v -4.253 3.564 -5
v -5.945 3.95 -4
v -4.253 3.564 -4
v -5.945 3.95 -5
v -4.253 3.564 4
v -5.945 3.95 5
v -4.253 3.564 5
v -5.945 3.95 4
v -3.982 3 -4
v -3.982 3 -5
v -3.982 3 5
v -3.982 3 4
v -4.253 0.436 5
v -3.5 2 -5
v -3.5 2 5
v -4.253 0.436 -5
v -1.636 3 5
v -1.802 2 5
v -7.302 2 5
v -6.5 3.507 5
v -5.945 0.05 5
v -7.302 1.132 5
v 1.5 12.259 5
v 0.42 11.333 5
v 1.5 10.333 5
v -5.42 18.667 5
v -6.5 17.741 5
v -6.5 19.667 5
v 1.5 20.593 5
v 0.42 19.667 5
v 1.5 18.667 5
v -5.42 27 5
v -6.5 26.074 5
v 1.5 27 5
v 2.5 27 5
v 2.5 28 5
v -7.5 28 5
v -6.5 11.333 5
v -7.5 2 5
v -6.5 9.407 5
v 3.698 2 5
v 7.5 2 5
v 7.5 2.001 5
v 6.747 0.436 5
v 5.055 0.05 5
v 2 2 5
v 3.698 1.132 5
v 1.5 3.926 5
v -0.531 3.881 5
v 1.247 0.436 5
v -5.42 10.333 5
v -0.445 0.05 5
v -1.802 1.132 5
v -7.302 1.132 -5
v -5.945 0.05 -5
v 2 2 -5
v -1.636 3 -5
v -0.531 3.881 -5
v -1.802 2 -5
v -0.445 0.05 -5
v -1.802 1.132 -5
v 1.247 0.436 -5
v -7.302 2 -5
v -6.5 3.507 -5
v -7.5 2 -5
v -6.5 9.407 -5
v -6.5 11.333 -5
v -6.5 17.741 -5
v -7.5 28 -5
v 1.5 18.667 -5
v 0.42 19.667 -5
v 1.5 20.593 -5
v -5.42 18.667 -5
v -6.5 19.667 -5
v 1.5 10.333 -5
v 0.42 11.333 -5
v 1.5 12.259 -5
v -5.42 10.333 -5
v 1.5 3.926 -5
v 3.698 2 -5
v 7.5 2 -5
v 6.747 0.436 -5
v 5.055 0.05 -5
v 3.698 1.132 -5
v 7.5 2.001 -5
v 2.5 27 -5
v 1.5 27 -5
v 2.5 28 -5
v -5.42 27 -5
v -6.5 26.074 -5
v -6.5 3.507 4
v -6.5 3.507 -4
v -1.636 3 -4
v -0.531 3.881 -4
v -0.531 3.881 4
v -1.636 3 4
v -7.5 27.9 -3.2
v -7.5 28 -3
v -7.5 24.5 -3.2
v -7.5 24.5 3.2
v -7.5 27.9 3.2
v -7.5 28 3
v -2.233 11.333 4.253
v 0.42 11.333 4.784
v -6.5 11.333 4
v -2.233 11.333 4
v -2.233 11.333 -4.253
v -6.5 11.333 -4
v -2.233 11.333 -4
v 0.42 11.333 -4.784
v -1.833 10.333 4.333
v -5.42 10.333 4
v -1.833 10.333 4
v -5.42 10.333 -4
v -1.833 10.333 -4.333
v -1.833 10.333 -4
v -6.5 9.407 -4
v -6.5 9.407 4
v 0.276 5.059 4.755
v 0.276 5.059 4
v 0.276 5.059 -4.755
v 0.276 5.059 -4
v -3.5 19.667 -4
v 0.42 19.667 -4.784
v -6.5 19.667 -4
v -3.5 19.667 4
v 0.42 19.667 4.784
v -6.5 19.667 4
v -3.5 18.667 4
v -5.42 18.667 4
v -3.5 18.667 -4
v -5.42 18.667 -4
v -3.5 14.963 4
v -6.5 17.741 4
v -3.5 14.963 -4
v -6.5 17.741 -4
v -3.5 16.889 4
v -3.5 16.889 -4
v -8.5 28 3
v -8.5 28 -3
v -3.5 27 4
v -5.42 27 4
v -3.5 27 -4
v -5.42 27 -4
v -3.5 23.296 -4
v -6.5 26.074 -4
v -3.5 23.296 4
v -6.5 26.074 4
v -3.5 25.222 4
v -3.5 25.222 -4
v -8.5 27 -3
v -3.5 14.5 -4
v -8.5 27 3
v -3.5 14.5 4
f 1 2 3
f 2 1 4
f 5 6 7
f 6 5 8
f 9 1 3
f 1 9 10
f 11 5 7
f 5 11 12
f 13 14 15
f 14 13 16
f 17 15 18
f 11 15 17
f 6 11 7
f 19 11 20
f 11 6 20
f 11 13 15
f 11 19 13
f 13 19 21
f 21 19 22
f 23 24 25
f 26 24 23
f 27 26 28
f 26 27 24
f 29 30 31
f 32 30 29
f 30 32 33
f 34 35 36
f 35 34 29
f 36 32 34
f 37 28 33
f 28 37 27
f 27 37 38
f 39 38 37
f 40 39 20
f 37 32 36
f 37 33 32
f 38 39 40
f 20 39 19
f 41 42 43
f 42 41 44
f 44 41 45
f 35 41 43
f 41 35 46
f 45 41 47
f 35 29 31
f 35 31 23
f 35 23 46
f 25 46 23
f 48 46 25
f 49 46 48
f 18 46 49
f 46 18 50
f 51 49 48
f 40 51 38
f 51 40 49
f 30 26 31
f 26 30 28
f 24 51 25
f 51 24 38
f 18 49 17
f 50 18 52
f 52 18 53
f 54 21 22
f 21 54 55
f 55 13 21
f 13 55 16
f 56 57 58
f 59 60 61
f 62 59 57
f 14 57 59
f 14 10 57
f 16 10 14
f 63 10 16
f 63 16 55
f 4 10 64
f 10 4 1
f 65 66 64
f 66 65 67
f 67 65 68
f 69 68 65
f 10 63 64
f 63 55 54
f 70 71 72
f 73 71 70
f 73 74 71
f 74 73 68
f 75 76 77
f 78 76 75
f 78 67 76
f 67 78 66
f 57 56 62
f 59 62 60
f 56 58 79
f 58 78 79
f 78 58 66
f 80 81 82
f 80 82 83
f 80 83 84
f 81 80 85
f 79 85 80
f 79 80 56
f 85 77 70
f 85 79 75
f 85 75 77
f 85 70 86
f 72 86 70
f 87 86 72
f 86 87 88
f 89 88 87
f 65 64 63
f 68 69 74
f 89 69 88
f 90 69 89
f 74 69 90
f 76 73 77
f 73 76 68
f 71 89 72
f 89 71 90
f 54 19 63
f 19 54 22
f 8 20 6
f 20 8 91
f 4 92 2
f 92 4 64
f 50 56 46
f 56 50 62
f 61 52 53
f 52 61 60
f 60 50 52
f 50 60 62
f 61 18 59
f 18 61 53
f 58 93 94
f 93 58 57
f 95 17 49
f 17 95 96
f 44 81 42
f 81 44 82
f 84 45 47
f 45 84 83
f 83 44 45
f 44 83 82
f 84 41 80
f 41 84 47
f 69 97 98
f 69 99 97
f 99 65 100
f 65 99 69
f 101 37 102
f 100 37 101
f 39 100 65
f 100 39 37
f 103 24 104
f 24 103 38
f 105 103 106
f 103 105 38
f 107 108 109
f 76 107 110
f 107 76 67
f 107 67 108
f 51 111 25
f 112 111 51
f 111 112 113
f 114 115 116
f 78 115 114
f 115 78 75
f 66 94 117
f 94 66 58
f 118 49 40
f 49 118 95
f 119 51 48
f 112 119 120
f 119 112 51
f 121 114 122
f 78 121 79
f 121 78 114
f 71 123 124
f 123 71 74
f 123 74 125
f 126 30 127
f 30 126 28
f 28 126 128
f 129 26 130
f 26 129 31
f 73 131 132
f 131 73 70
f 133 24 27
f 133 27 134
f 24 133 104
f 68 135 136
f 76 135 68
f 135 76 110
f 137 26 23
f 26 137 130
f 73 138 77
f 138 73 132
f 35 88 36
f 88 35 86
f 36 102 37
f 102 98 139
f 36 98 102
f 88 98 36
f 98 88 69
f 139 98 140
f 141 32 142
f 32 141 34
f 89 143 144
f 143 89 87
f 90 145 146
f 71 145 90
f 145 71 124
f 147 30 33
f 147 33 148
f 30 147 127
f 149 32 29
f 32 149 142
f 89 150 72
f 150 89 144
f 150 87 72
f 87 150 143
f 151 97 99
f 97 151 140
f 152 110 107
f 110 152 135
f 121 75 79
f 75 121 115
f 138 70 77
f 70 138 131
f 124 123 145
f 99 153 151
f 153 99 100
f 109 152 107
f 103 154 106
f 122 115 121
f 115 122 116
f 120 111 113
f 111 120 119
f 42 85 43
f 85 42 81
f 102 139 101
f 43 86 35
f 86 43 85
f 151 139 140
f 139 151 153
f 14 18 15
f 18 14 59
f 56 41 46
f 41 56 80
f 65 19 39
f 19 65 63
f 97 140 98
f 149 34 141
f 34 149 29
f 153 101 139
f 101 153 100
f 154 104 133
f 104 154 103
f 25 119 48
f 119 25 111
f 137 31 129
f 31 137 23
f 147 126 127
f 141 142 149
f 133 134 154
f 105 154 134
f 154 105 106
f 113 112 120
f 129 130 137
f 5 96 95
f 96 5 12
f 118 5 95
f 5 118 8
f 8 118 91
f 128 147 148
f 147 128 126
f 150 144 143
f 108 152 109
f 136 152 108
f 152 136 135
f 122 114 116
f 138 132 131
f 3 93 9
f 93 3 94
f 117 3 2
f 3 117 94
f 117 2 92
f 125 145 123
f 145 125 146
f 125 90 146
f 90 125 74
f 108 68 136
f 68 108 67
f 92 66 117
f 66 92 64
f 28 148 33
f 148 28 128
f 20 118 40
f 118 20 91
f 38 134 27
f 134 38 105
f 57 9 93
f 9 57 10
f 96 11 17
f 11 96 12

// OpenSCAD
// [FL_INDEX: keywords="openscad, 3d_parametric, Game_of_thrones__replacement_siege_tower, csg_solid" | COT="Parametric OpenSCAD design from 3DCodeverse"]
// Title: Game of thrones, replacement siege tower

height = 25;

base_of_center_section = 10;

base_of_support_section = 5;

size_of_wood_shapes = 1;

radius_of_wheels = 2;

number_of_levels = 3;

number_of_wheels = 3;

tower(
	height,
	base_of_center_section,
	base_of_support_section,
	size_of_wood_shapes,
	radius_of_wheels,
	number_of_levels,
	number_of_wheels
);

/**
h  = height of the tower
b  = base of the center section
b2 = base of the support zone
s  = size of the wood in the sides
r  = radius of the wheels
hn = number of levels of the tower
wn = number of wheels
*/
module tower(h,b,b2,s,r,hn,wn)
	translate([-(b+b2)/2,r,-b/2]) {
	//Main body of the tower
	hull(){
		translate([b,0,0]) cube([b2,0.001,b]);
		translate([b-s,0,0]) cube([s,h,b]);
		//gate
		translate([-s,h,2*s]) cube([2*s,s,b-4*s]);
	}
	translate([0,0,s])  cube([b,h,b-2*s]);
	cube([s,h,b]);
	//wheels
	for(i = [0:wn-1]){
		translate([r + i*(b+b2-2*r)/(wn-1),0,0])
			cylinder(b,r,r);
	}
	//wood divisions
	cube([b,s,b]);
	for(i = [1:hn]) translate([0,i*h/wn]) {
		cube([b,s,b]);
		hull(){
			cube([s,s,b]);
			translate([b-s,-h/wn,0]) cube([s,s,b]);
		}
	}
	
}
